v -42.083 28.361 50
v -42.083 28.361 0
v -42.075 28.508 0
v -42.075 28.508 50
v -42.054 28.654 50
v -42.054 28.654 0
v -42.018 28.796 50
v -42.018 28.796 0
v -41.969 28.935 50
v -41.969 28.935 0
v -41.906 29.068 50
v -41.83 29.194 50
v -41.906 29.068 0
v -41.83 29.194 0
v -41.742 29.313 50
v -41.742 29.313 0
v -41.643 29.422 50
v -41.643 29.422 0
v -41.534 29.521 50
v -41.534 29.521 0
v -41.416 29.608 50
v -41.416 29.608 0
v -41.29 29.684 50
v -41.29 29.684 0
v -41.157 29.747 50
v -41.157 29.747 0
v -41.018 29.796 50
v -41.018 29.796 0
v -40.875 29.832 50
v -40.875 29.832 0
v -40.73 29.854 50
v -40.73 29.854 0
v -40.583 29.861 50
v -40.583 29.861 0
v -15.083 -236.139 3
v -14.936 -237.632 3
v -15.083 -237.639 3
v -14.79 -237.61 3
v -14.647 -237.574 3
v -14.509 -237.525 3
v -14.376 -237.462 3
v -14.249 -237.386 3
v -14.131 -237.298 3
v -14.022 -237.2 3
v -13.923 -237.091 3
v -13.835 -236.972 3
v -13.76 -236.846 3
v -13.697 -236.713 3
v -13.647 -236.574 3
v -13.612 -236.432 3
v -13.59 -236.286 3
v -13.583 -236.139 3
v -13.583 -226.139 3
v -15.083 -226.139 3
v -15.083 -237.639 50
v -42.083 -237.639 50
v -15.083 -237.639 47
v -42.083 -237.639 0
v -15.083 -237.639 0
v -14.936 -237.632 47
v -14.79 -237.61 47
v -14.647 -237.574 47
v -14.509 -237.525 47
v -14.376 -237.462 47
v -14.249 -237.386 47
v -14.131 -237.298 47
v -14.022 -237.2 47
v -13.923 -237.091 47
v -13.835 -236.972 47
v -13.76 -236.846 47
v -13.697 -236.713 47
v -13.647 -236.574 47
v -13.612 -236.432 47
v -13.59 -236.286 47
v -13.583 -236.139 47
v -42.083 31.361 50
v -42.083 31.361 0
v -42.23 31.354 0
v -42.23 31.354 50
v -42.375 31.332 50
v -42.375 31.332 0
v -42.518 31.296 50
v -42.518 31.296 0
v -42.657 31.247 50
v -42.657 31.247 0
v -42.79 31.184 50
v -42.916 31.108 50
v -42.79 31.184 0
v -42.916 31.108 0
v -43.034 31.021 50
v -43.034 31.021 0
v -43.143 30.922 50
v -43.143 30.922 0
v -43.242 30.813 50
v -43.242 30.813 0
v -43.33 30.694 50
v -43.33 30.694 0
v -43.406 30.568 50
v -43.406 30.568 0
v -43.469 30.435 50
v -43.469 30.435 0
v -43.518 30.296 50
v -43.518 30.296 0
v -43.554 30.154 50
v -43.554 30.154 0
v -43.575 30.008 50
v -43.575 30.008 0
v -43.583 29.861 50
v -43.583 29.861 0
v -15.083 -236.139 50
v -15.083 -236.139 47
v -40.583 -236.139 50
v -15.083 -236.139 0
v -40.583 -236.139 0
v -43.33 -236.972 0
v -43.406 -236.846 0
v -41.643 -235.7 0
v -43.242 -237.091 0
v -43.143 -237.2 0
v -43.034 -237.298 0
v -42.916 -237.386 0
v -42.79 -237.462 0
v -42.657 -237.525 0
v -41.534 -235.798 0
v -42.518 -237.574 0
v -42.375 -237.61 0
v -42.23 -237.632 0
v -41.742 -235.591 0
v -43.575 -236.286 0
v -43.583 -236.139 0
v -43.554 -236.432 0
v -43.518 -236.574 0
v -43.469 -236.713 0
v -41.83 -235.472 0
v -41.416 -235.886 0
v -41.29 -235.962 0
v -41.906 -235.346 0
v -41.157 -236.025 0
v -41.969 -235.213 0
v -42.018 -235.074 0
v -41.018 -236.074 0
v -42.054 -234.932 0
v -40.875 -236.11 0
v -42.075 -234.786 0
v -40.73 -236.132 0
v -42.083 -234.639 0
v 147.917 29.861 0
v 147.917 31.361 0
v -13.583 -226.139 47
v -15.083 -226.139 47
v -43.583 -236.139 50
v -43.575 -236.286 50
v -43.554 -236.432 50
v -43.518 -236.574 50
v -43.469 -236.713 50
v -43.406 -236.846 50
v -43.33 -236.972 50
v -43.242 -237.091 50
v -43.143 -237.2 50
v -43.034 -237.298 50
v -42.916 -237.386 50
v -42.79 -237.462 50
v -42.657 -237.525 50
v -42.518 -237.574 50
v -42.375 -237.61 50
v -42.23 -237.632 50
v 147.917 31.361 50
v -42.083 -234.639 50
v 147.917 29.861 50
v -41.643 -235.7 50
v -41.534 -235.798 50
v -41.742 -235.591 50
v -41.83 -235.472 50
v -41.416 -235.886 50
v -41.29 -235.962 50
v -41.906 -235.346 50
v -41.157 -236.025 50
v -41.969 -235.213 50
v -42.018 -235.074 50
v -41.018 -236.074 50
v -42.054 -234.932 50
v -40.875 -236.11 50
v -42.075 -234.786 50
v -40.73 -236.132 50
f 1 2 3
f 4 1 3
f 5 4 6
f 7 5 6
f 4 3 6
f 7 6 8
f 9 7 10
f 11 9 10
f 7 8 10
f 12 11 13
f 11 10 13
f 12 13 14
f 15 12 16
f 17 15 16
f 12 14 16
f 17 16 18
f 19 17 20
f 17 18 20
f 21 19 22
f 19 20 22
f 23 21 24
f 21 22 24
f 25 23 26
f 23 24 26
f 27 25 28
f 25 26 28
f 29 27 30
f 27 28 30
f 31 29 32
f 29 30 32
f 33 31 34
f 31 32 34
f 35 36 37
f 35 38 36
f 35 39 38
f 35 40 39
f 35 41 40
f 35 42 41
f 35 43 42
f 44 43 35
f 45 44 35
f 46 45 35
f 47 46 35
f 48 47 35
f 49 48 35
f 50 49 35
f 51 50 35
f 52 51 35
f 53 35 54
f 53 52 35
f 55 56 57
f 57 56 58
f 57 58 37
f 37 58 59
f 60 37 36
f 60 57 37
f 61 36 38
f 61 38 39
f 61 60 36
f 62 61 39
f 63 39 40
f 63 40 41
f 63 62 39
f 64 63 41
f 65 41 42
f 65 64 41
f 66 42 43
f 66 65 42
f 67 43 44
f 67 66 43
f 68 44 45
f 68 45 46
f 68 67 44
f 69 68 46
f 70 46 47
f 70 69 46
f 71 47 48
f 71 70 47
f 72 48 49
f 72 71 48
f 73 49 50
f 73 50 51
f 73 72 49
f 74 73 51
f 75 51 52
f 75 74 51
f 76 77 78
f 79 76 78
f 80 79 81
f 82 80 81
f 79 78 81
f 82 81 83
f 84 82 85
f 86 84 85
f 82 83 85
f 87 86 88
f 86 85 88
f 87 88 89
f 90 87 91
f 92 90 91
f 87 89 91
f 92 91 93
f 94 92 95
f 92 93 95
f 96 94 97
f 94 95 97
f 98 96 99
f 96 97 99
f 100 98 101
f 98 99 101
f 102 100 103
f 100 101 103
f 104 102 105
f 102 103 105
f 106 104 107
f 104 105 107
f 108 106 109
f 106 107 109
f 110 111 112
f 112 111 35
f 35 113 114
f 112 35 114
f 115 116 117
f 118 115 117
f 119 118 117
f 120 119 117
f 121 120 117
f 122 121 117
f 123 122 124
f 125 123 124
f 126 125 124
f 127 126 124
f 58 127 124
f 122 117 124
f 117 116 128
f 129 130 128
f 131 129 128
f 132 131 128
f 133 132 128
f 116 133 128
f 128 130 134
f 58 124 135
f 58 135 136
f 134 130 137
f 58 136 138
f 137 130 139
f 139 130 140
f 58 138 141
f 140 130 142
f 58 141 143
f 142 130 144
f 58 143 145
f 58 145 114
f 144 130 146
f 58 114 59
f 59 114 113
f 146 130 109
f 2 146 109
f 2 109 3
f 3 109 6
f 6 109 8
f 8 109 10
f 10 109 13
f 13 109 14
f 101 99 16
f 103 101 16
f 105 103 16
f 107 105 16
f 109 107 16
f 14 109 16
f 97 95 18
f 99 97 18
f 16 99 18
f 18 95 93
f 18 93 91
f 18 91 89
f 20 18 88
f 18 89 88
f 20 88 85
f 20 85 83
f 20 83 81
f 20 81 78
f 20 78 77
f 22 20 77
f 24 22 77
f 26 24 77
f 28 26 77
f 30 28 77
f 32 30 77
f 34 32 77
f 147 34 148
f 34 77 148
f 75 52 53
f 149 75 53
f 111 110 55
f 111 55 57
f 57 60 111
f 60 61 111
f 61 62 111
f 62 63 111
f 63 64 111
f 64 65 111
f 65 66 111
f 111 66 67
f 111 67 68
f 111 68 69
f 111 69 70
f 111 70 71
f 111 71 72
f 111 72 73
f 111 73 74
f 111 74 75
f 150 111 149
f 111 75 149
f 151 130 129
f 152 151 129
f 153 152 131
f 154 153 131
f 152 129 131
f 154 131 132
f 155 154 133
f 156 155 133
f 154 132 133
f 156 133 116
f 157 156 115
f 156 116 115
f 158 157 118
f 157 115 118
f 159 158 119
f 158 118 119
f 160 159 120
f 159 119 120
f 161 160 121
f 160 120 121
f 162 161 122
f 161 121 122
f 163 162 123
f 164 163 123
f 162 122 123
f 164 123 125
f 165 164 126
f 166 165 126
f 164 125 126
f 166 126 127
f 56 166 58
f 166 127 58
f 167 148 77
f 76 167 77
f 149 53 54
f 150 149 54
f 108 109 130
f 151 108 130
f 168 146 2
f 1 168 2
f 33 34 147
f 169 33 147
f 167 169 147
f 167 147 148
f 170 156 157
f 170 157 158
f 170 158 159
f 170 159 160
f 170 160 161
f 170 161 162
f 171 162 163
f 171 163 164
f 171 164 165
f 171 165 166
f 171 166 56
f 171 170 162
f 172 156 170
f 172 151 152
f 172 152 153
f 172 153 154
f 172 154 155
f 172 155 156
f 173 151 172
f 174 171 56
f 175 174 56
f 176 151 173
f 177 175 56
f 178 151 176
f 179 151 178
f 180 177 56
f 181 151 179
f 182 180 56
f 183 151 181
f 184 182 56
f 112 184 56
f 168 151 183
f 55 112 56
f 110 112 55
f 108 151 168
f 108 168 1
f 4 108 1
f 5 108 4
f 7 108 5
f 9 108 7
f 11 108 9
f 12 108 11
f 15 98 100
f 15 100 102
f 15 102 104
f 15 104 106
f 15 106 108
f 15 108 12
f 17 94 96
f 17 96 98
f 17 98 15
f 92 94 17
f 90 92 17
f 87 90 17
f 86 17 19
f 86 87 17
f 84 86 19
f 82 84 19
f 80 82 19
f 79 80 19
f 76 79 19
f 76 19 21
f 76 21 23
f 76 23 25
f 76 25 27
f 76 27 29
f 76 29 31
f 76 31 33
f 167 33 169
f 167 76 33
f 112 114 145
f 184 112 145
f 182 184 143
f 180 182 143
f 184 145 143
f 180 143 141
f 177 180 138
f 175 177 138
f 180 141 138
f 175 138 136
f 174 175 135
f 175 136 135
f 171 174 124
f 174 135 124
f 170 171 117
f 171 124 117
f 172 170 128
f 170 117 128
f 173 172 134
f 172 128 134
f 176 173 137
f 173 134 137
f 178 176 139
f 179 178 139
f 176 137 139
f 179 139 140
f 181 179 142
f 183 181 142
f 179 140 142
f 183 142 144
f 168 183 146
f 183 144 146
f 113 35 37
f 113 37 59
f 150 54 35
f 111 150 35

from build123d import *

# Parameters (mm, degrees)
EXTRUDE_1_DEPTH     = 50
SKETCH_3_W          = 3
SKETCH_3_H          = 11.5
CUT_EXTRUDE_1_DEPTH = 1.5
FILLET_1_R          = 1.5


with BuildPart() as part:
    # 草图1 → 凸台-拉伸1 (new body)
    with BuildSketch(Plane.XY):
        with BuildLine():
            Line((-40.582688737, 29.861069553), (147.917311263, 29.861069553))
            Line((147.917311263, 29.861069553), (147.917311263, 31.361069553))
            Line((147.917311263, 31.361069553), (-42.082688737, 31.361069553))
            ThreePointArc((-42.082688737, 31.361069553), (-43.143348909, 30.921729725), (-43.582688737, 29.861069553))
            Line((-43.582688737, 29.861069553), (-43.582688737, -236.138930447))
            ThreePointArc((-43.582688737, -236.138930447), (-43.143348909, -237.199590619), (-42.082688737, -237.638930447))
            Line((-42.082688737, -237.638930447), (-15.082688737, -237.638930447))
            Line((-15.082688737, -237.638930447), (-13.582688737, -237.638930447))
            Line((-13.582688737, -237.638930447), (-13.582688737, -236.138930447))
            Line((-13.582688737, -236.138930447), (-13.582688737, -226.138930447))
            Line((-13.582688737, -226.138930447), (-15.082688737, -226.138930447))
            Line((-15.082688737, -226.138930447), (-15.082688737, -234.638930447))
            Line((-15.082688737, -234.638930447), (-15.082688737, -236.138930447))
            Line((-15.082688737, -236.138930447), (-16.582688737, -236.138930447))
            Line((-16.582688737, -236.138930447), (-40.582688737, -236.138930447))
            ThreePointArc((-40.582688737, -236.138930447), (-41.643348909, -235.699590619), (-42.082688737, -234.638930447))
            Line((-42.082688737, -234.638930447), (-42.082688737, -226.138930447))
            Line((-42.082688737, -226.138930447), (-42.082688737, -50.138930447))
            Line((-42.082688737, -50.138930447), (-42.082688737, 28.361069553))
            ThreePointArc((-42.082688737, 28.361069553), (-41.643348909, 29.421729725), (-40.582688737, 29.861069553))
        make_face()
    extrude(amount=EXTRUDE_1_DEPTH)

    # 草图3 → 切除-拉伸1 (cut)
    with BuildSketch(Plane(origin=(-13.582688737, 0, 0), x_dir=(0, 0, -1), z_dir=(1, 0, 0))):
        with Locations((-48.5, -231.888930447)):
            Rectangle(SKETCH_3_W, SKETCH_3_H)
        with Locations((-1.5, -231.888930447)):
            Rectangle(SKETCH_3_W, SKETCH_3_H)
    extrude(amount=-CUT_EXTRUDE_1_DEPTH, mode=Mode.SUBTRACT)

    # 圆角1
    fillet_1_edges = [part.edges().sort_by_distance(p)[0] for p in [
        (-13.582688737, -237.638930447, 25),
    ]]
    fillet(fillet_1_edges, radius=FILLET_1_R)


solid = part.part
